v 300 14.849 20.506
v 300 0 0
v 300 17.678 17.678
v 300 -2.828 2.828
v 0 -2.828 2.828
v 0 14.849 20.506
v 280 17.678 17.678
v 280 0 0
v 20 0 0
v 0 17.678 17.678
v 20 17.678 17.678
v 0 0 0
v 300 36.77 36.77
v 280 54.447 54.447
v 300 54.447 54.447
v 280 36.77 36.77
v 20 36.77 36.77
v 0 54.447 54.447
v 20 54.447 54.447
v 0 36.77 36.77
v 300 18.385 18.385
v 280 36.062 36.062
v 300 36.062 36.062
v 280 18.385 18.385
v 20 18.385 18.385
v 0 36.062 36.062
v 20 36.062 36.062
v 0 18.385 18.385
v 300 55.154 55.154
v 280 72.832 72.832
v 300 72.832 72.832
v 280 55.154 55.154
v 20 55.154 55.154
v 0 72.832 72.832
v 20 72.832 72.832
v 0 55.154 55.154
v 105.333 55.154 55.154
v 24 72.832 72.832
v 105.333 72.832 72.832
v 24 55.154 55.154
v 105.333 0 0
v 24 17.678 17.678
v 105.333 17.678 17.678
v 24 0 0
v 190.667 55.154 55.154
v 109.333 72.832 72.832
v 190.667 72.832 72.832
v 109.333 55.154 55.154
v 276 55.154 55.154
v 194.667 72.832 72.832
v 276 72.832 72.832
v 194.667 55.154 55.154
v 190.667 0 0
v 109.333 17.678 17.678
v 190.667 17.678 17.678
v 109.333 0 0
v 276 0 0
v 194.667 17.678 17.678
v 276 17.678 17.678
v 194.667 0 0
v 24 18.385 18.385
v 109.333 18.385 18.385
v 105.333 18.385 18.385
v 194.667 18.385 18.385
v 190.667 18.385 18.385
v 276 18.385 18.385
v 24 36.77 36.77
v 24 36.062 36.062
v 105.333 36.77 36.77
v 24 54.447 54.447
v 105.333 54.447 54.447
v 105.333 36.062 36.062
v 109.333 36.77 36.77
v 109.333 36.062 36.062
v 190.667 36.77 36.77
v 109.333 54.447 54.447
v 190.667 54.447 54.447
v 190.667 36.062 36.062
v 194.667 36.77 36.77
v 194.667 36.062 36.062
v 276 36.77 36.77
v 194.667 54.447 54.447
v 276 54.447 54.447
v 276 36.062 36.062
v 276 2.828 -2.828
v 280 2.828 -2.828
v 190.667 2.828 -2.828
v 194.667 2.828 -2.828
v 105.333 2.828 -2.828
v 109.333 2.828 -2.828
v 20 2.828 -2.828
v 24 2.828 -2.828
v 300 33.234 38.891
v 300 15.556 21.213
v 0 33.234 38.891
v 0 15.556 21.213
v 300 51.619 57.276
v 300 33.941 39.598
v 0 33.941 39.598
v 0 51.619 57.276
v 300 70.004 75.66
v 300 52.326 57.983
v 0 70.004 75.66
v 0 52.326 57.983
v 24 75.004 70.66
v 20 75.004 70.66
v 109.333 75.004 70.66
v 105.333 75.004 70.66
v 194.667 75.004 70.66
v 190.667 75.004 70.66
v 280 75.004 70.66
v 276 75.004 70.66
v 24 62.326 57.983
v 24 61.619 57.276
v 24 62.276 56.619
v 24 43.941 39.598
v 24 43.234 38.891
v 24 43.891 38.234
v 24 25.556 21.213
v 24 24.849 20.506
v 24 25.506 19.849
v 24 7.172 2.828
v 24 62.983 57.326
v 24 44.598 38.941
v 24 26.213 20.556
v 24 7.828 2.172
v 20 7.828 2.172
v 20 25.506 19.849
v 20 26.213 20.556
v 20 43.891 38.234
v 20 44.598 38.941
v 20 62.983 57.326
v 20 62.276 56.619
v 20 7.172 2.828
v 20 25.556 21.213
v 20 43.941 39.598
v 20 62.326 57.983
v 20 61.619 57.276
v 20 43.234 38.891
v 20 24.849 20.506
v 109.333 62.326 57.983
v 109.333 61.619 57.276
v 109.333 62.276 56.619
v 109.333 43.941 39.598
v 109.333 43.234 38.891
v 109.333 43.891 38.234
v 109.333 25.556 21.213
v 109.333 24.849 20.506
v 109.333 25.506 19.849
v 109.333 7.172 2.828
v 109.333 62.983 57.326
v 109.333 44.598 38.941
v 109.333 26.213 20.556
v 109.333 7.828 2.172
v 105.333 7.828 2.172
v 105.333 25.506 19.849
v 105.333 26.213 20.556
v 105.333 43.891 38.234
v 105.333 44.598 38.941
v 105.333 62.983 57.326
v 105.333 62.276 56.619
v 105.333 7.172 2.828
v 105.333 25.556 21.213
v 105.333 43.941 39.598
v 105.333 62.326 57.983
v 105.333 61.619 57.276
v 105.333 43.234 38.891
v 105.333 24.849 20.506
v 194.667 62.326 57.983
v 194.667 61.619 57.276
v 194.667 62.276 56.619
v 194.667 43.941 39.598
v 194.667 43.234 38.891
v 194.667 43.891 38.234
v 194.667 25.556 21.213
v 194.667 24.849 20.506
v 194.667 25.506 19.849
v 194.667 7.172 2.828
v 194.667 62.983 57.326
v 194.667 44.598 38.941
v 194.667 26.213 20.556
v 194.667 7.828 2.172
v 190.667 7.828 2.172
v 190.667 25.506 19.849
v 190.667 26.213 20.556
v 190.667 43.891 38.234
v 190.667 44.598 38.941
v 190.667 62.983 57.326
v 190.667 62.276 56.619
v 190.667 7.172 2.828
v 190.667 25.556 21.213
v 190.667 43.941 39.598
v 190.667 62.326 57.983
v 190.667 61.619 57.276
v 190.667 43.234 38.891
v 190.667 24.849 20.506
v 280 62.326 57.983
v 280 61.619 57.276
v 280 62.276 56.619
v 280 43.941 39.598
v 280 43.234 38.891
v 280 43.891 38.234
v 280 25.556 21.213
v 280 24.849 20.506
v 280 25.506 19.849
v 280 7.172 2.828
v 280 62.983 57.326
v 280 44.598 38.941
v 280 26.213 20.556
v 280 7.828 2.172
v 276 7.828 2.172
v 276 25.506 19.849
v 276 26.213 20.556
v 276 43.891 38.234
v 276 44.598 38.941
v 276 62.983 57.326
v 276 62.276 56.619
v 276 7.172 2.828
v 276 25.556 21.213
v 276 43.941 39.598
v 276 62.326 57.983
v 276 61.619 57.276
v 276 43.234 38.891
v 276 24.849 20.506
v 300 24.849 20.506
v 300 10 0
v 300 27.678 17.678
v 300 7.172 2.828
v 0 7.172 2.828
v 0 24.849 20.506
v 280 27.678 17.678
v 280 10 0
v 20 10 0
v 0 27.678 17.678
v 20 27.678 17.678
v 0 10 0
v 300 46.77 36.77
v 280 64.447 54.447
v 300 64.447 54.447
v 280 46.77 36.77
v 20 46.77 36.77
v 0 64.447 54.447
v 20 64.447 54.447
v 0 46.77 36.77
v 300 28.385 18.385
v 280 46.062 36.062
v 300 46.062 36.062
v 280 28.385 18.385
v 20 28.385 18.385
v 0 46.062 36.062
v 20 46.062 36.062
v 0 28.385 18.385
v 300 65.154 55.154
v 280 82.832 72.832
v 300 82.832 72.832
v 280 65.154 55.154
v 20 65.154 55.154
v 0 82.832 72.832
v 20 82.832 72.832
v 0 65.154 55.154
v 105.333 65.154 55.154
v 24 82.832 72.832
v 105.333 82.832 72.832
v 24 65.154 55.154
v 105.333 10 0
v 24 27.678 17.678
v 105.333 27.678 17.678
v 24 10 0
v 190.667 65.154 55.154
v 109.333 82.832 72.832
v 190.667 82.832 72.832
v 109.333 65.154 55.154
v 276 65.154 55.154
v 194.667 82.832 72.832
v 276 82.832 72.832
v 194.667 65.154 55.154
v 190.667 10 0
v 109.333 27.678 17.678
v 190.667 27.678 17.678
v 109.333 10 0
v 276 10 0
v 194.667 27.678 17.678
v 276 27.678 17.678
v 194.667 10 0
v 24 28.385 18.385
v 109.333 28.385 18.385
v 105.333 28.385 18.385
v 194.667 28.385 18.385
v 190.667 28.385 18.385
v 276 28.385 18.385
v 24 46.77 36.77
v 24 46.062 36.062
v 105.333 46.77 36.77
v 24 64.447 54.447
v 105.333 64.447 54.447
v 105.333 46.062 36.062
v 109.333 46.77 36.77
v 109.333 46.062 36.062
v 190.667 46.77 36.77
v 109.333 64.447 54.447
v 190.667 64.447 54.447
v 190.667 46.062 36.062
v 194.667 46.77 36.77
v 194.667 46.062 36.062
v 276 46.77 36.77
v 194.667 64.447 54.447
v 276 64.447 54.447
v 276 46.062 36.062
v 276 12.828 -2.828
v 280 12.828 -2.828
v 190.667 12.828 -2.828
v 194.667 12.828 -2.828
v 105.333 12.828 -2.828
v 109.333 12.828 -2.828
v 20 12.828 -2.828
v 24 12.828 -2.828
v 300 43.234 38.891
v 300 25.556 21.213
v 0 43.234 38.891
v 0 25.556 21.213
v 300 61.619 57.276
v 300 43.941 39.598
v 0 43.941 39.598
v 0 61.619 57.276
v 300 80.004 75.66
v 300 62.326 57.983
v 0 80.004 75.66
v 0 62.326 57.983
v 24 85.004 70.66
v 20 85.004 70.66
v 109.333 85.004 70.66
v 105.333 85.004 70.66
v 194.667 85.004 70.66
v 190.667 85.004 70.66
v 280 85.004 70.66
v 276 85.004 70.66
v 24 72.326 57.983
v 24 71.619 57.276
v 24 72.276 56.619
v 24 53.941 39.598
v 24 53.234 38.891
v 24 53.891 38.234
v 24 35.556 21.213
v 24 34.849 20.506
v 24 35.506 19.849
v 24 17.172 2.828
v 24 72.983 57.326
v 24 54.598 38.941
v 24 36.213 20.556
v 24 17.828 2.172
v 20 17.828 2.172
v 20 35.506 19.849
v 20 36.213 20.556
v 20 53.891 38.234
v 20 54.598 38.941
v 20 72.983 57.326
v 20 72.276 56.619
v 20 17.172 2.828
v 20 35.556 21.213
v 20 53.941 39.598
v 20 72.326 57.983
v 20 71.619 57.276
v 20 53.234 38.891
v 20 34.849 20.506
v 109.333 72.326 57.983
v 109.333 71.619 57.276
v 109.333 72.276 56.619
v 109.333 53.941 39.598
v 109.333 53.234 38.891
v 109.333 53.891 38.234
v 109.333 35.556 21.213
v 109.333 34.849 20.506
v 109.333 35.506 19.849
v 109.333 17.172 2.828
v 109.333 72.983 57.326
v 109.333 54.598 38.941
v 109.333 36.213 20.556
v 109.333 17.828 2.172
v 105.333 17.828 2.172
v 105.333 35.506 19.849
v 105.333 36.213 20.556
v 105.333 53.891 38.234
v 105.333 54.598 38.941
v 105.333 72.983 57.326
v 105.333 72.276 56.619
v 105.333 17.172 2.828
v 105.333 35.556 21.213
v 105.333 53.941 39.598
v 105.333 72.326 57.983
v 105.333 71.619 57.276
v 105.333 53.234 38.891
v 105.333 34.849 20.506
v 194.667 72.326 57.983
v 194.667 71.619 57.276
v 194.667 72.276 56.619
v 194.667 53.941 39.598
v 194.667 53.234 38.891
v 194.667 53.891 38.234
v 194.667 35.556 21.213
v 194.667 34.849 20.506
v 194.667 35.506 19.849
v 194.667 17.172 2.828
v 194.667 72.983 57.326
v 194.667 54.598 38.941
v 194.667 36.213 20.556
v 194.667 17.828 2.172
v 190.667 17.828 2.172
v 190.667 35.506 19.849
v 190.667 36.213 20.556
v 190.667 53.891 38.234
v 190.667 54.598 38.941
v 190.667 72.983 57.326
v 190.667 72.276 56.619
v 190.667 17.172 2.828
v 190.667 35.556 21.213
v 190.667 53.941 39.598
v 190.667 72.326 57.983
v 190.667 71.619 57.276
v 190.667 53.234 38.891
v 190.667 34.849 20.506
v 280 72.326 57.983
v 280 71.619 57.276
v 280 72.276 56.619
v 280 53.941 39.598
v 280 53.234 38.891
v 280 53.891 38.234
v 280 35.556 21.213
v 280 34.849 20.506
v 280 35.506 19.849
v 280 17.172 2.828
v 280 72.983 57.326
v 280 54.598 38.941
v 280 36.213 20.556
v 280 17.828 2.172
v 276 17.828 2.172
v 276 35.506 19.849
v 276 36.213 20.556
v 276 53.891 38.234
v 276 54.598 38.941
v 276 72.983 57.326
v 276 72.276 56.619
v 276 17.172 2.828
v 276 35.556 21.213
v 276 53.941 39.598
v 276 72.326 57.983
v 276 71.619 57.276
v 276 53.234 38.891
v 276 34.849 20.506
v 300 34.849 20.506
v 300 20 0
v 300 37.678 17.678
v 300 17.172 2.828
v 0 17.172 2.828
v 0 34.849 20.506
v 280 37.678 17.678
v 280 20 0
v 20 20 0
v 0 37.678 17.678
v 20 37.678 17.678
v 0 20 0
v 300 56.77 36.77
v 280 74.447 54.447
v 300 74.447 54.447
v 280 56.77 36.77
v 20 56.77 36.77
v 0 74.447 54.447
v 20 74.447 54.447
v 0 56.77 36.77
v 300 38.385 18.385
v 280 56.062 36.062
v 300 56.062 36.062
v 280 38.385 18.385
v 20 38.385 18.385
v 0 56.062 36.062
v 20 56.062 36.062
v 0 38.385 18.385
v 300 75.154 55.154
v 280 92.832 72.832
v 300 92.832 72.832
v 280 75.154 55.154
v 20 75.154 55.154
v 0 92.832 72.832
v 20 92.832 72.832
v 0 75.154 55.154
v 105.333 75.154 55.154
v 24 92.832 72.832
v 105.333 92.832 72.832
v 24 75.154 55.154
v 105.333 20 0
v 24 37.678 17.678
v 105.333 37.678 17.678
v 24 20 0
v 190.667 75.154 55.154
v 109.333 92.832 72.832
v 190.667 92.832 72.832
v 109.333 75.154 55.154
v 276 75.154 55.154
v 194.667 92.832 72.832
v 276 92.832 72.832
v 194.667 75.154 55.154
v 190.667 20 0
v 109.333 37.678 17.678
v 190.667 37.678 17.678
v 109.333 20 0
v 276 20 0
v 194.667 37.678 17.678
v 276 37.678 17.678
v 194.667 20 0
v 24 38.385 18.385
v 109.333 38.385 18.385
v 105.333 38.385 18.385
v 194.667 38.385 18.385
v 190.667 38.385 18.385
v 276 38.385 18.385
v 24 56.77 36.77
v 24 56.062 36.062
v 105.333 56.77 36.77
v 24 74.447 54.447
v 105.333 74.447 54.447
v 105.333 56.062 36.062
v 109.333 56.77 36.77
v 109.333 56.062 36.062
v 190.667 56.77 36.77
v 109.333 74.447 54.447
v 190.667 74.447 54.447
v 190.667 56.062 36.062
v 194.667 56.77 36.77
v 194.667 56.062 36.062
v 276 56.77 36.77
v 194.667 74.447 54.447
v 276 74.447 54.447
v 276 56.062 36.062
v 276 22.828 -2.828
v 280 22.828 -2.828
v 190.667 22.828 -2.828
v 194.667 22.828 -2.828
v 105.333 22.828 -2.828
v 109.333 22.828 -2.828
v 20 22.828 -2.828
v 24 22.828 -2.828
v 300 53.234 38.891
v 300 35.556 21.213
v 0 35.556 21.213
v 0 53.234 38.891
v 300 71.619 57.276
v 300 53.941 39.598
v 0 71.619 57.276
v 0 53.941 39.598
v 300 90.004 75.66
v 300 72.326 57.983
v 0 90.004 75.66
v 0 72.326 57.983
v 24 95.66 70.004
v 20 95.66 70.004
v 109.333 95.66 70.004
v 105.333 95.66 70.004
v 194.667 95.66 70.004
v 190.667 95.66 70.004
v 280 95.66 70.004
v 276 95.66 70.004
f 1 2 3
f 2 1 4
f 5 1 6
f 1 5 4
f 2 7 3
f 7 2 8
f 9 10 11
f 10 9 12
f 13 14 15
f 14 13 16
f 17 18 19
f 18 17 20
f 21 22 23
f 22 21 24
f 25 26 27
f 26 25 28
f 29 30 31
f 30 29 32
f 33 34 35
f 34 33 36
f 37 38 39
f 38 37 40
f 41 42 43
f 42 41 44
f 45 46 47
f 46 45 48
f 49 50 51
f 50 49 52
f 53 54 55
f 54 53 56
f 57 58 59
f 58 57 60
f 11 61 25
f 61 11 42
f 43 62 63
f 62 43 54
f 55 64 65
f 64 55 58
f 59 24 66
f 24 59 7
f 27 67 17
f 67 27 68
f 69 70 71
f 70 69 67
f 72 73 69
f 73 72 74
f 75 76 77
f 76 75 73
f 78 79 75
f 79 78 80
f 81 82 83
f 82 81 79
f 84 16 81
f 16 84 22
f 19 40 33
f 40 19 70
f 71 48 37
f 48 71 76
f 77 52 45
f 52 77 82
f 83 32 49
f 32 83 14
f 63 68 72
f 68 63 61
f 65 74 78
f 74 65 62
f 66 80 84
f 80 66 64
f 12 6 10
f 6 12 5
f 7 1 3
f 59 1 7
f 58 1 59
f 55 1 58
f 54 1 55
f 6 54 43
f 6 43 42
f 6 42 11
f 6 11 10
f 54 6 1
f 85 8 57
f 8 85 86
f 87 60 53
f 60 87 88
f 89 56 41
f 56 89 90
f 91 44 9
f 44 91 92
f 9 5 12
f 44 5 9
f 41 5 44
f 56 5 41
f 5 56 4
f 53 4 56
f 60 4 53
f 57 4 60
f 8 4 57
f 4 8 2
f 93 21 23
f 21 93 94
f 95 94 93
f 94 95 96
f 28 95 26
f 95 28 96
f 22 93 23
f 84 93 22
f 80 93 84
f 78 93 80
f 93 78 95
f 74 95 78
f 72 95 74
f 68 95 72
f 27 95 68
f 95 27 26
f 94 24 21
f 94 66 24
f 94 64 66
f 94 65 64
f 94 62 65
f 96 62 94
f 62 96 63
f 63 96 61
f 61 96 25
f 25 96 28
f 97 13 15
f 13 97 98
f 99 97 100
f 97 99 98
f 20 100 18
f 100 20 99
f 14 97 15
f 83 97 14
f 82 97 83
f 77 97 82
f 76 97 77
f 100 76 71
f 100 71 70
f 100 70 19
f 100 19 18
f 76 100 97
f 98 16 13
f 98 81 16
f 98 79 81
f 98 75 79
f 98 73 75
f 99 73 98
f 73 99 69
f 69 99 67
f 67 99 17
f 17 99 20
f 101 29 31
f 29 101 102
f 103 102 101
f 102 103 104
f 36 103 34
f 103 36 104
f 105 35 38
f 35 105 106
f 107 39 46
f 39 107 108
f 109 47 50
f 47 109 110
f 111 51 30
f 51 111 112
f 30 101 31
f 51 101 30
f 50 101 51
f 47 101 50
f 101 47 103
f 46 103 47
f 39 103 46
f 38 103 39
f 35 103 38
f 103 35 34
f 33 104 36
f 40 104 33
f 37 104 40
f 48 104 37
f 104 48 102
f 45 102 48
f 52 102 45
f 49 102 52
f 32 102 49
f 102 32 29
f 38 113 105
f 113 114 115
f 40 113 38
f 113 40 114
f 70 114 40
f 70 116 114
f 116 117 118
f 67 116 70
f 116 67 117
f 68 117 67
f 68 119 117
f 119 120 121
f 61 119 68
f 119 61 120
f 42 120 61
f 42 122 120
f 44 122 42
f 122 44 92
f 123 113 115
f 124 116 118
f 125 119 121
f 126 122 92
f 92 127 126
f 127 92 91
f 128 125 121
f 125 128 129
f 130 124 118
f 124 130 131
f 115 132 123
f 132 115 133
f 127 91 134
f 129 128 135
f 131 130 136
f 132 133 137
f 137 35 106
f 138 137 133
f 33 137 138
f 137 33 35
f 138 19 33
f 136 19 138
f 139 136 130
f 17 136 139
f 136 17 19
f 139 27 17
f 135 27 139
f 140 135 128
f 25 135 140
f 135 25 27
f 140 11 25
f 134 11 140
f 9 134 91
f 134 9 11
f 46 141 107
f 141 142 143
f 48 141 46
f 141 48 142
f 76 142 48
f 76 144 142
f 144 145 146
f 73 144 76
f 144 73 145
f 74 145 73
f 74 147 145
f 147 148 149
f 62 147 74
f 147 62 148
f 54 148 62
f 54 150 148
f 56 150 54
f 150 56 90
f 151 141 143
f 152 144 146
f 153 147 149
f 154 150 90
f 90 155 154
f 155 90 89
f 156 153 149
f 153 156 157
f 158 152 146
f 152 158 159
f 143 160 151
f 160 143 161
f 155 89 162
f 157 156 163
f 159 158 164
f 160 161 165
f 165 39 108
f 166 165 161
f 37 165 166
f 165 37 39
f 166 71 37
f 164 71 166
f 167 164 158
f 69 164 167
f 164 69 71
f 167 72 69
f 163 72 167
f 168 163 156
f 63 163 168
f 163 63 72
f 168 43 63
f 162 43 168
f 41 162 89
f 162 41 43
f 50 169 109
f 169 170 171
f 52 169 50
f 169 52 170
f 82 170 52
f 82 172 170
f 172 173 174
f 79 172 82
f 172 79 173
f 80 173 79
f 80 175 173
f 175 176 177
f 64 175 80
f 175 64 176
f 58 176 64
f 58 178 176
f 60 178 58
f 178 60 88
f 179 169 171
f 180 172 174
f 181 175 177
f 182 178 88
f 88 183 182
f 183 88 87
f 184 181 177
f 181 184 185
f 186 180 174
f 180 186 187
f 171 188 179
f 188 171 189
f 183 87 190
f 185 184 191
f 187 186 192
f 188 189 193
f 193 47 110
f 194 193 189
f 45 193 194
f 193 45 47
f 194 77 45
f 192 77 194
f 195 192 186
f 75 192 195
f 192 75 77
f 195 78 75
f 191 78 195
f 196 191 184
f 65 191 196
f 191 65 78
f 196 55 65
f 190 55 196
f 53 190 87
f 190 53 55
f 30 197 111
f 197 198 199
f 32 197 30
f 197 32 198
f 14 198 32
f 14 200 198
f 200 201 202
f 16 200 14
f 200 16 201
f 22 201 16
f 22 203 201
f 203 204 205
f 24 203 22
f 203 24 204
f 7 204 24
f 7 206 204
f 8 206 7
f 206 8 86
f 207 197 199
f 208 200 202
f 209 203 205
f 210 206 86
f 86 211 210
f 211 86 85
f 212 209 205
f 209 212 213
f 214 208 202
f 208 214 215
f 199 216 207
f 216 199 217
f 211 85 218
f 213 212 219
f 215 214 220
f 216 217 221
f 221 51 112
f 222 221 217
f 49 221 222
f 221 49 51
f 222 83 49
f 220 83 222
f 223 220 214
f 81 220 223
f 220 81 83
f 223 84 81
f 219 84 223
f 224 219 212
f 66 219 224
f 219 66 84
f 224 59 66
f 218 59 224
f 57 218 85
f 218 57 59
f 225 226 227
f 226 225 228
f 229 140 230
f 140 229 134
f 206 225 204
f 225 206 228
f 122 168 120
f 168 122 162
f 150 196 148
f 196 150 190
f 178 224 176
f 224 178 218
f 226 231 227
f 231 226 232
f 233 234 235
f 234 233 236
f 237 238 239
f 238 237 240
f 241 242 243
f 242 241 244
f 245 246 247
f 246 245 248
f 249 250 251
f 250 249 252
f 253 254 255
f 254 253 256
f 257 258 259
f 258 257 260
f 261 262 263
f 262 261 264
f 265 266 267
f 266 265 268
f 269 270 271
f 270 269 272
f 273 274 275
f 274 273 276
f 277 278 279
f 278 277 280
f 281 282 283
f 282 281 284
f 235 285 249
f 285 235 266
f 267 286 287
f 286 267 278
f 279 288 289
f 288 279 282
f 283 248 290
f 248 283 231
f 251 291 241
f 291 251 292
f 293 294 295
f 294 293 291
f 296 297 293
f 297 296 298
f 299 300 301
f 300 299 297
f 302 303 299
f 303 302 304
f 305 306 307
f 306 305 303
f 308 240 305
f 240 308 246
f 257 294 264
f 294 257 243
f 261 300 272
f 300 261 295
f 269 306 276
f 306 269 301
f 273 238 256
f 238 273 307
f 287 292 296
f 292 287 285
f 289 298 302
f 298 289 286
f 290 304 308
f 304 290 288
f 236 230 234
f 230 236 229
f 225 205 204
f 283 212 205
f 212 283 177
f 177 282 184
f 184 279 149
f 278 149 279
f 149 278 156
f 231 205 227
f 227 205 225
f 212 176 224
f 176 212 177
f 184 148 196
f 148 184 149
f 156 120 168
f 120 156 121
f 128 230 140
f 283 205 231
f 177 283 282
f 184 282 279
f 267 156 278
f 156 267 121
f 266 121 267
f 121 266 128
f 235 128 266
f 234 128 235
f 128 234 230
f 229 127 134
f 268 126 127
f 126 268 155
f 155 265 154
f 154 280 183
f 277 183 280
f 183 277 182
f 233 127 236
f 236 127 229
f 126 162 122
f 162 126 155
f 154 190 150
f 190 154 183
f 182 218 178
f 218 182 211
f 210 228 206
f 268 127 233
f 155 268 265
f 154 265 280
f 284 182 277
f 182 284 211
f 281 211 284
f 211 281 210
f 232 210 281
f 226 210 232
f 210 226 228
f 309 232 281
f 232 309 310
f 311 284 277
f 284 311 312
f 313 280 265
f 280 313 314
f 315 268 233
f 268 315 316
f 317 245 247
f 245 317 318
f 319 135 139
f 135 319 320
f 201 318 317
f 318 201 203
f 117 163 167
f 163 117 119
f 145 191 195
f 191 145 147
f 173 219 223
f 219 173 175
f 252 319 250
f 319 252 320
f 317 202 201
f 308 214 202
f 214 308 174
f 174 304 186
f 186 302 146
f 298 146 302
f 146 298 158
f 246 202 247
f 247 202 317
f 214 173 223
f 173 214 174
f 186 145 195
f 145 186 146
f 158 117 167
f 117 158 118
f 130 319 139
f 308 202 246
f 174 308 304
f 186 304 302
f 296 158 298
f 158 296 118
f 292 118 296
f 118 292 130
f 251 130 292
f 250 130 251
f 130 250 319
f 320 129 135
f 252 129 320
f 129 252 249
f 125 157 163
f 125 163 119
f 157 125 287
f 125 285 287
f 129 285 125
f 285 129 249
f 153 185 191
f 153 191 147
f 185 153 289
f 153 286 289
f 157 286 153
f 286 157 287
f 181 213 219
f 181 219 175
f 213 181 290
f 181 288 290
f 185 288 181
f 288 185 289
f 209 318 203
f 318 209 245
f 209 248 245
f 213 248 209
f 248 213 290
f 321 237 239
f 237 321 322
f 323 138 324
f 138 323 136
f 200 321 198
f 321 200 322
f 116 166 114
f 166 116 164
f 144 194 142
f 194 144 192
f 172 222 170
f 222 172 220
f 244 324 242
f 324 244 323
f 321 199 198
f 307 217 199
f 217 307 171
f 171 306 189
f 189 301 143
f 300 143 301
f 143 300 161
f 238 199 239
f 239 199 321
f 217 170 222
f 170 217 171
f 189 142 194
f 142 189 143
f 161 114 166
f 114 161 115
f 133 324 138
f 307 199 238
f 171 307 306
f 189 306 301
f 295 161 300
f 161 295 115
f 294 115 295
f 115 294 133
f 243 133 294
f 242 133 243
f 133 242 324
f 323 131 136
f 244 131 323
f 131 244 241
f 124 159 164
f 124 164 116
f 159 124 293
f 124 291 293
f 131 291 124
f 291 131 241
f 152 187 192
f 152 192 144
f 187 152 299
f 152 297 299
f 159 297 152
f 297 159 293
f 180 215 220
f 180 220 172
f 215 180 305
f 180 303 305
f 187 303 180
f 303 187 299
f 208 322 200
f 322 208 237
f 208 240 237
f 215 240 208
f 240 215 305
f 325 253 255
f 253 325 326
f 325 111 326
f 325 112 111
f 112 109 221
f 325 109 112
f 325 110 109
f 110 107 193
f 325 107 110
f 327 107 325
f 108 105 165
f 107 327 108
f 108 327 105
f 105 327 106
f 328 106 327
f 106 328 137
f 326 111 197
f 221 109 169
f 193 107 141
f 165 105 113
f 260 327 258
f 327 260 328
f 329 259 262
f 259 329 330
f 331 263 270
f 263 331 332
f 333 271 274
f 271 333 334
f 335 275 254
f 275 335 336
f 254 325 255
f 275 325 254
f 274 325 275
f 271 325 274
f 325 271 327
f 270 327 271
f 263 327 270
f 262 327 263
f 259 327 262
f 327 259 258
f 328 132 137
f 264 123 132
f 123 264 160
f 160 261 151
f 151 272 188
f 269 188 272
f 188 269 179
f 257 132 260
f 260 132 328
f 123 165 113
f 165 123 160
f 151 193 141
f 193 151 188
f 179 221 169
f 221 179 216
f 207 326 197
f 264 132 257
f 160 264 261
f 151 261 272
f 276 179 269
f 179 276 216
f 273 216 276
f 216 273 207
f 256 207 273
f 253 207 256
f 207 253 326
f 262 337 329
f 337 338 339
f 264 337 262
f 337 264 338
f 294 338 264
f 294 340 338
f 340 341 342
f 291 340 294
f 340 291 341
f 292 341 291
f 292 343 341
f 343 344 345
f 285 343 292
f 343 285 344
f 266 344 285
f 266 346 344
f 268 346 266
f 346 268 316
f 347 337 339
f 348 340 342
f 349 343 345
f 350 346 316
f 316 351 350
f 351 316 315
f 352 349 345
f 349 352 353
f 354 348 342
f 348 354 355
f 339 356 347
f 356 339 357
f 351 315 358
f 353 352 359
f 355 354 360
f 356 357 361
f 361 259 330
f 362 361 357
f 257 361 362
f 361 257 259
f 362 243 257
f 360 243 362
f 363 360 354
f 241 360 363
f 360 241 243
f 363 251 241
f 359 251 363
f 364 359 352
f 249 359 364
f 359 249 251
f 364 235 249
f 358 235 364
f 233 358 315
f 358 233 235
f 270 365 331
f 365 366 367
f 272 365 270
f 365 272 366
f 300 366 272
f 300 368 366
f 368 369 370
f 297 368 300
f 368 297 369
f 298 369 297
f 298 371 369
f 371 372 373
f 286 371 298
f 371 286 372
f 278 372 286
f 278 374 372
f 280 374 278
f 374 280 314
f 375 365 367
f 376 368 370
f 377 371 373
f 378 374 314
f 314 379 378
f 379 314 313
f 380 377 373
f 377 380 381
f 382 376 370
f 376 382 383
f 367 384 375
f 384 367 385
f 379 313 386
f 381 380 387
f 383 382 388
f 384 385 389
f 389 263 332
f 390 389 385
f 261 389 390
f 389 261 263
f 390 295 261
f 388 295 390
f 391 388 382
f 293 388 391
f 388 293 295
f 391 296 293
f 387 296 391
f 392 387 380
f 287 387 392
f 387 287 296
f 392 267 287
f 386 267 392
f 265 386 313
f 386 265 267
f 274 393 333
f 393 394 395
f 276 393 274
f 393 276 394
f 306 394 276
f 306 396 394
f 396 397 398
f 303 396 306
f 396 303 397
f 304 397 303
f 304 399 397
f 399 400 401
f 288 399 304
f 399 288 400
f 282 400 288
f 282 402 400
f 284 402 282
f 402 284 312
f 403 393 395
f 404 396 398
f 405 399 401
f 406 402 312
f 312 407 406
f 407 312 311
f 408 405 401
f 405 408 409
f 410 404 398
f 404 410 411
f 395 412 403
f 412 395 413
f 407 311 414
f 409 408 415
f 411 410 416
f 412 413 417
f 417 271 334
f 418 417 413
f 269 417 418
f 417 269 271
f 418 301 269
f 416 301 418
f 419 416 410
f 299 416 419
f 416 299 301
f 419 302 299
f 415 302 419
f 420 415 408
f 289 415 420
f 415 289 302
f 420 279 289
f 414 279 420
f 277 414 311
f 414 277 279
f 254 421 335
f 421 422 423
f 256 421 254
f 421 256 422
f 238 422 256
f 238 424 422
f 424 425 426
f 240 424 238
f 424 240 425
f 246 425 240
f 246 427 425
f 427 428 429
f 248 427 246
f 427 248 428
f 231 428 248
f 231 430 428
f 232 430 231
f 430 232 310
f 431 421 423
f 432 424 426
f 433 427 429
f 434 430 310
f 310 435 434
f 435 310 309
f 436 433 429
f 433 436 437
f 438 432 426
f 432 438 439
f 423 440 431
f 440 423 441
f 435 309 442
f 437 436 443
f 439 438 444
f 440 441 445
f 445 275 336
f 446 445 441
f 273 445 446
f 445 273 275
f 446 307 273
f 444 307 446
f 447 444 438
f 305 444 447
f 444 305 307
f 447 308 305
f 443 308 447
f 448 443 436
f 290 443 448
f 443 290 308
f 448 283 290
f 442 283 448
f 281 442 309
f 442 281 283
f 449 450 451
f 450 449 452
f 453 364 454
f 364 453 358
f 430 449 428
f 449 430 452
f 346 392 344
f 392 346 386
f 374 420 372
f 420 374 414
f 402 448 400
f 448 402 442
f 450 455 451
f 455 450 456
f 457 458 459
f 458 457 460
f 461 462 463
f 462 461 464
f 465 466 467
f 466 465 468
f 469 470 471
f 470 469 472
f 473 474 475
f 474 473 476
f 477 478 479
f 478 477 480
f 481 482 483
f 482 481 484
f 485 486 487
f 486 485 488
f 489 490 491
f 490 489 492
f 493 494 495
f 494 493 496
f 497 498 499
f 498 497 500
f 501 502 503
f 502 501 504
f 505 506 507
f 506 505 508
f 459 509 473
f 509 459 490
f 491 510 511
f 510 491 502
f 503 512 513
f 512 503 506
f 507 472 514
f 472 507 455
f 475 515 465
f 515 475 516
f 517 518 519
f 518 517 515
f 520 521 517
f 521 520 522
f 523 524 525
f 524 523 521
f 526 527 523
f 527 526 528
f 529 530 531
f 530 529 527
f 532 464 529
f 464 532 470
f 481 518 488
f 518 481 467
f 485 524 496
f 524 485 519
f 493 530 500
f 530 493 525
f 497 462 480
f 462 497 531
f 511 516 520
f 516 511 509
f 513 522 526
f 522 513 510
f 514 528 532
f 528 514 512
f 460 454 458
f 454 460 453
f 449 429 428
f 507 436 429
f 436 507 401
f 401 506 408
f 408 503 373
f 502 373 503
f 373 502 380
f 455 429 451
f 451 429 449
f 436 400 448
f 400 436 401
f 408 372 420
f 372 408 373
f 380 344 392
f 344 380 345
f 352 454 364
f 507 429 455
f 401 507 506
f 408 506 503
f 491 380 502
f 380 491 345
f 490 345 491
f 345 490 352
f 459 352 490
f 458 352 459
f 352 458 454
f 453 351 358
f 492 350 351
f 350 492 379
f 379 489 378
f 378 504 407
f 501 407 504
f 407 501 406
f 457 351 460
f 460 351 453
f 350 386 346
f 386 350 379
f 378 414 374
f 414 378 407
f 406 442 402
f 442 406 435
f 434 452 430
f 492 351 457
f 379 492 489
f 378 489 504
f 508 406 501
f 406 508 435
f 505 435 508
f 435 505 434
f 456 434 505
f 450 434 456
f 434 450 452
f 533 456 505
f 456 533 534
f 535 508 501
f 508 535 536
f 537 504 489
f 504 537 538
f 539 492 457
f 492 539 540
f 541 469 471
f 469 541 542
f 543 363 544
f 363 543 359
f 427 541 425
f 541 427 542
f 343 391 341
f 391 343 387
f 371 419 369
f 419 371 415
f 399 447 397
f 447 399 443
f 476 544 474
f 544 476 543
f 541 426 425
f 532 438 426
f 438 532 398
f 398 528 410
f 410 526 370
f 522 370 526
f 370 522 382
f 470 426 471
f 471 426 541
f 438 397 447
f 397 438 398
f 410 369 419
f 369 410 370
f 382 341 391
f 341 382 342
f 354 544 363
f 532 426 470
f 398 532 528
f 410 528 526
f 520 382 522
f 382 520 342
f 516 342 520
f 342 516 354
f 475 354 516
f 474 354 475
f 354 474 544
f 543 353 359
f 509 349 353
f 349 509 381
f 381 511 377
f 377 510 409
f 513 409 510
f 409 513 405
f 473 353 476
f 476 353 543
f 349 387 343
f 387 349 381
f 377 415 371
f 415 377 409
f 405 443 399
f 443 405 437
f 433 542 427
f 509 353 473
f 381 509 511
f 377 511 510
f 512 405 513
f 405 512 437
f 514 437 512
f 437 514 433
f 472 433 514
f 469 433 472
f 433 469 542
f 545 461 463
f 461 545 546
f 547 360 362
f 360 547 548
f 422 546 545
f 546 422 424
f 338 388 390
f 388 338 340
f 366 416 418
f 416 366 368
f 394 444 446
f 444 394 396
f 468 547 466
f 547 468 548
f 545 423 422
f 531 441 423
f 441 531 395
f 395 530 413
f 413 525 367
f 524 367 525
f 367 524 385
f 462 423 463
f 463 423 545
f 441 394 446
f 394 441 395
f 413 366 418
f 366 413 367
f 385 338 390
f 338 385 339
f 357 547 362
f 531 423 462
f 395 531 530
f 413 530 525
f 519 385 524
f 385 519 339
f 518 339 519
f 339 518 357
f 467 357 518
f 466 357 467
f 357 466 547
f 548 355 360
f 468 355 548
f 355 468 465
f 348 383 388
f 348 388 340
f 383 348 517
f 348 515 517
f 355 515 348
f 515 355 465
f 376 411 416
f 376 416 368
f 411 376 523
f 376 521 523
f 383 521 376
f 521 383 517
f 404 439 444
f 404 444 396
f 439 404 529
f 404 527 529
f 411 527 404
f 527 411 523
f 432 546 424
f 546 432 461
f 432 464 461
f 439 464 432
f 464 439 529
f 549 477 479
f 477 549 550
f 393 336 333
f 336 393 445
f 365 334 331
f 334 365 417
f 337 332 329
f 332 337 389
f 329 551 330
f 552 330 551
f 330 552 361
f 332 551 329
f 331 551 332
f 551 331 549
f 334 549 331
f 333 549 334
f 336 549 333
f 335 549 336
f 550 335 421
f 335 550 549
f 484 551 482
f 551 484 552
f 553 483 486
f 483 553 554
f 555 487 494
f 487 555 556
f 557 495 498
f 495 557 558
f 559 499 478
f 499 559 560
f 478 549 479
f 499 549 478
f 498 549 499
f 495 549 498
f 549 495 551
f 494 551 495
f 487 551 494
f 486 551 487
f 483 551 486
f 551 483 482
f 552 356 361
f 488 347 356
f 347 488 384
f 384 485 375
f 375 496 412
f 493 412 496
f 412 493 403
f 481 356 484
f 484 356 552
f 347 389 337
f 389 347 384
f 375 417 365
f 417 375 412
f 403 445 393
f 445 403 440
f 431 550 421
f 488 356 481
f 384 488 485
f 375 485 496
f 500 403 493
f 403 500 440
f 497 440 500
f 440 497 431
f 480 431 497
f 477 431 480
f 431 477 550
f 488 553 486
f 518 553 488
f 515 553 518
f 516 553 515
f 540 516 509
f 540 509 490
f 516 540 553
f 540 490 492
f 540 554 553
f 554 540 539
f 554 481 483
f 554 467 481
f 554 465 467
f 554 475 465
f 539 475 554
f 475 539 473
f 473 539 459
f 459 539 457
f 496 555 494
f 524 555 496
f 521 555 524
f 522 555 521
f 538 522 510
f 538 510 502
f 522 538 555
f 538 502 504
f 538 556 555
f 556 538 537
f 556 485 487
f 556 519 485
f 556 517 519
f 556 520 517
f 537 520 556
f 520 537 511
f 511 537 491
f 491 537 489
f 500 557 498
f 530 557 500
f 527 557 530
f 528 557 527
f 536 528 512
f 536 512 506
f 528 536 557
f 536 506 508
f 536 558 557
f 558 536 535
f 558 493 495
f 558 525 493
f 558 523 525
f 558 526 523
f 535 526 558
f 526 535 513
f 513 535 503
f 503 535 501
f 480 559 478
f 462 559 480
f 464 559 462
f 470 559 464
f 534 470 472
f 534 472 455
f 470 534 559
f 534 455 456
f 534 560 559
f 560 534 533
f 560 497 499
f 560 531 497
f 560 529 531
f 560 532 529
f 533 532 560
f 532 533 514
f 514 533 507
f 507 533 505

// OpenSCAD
module tablon(largo=300,grosor=4,cant_div=4,ancho_div=25, sep_div=1,
      cant_trav=4, med_trav=4,marg_trav=20,
      x=0,y=0,z=0)
{
 union()   
 {
  //-- Dibuja las divisiones del tablón   
  for (i=[0:cant_div-1]) 
   { translate([x,y+i*(ancho_div+sep_div),z]) 
     cube([largo,ancho_div,grosor]); }
  //-- Calcula los valores para los travesaños   
  dist_trav=(largo-marg_trav*2-cant_trav*med_trav)/(cant_trav-1);
  largo_trav=cant_div*ancho_div+(cant_div-1)*sep_div;
  x_trav=x+marg_trav;    
  //-- Dibuja los travesaños   
  for (i=[0:cant_trav-1]) 
   { translate([x_trav+i*(med_trav+dist_trav), y,z-med_trav]) 
     cube([med_trav,largo_trav,med_trav]); }
 }  
}

rotate([45,0,0])
tablon();
translate([0,10,0]) 
rotate([45,0,0])
tablon();
translate([0,20,0]) 
rotate([45,0,0])
tablon();
